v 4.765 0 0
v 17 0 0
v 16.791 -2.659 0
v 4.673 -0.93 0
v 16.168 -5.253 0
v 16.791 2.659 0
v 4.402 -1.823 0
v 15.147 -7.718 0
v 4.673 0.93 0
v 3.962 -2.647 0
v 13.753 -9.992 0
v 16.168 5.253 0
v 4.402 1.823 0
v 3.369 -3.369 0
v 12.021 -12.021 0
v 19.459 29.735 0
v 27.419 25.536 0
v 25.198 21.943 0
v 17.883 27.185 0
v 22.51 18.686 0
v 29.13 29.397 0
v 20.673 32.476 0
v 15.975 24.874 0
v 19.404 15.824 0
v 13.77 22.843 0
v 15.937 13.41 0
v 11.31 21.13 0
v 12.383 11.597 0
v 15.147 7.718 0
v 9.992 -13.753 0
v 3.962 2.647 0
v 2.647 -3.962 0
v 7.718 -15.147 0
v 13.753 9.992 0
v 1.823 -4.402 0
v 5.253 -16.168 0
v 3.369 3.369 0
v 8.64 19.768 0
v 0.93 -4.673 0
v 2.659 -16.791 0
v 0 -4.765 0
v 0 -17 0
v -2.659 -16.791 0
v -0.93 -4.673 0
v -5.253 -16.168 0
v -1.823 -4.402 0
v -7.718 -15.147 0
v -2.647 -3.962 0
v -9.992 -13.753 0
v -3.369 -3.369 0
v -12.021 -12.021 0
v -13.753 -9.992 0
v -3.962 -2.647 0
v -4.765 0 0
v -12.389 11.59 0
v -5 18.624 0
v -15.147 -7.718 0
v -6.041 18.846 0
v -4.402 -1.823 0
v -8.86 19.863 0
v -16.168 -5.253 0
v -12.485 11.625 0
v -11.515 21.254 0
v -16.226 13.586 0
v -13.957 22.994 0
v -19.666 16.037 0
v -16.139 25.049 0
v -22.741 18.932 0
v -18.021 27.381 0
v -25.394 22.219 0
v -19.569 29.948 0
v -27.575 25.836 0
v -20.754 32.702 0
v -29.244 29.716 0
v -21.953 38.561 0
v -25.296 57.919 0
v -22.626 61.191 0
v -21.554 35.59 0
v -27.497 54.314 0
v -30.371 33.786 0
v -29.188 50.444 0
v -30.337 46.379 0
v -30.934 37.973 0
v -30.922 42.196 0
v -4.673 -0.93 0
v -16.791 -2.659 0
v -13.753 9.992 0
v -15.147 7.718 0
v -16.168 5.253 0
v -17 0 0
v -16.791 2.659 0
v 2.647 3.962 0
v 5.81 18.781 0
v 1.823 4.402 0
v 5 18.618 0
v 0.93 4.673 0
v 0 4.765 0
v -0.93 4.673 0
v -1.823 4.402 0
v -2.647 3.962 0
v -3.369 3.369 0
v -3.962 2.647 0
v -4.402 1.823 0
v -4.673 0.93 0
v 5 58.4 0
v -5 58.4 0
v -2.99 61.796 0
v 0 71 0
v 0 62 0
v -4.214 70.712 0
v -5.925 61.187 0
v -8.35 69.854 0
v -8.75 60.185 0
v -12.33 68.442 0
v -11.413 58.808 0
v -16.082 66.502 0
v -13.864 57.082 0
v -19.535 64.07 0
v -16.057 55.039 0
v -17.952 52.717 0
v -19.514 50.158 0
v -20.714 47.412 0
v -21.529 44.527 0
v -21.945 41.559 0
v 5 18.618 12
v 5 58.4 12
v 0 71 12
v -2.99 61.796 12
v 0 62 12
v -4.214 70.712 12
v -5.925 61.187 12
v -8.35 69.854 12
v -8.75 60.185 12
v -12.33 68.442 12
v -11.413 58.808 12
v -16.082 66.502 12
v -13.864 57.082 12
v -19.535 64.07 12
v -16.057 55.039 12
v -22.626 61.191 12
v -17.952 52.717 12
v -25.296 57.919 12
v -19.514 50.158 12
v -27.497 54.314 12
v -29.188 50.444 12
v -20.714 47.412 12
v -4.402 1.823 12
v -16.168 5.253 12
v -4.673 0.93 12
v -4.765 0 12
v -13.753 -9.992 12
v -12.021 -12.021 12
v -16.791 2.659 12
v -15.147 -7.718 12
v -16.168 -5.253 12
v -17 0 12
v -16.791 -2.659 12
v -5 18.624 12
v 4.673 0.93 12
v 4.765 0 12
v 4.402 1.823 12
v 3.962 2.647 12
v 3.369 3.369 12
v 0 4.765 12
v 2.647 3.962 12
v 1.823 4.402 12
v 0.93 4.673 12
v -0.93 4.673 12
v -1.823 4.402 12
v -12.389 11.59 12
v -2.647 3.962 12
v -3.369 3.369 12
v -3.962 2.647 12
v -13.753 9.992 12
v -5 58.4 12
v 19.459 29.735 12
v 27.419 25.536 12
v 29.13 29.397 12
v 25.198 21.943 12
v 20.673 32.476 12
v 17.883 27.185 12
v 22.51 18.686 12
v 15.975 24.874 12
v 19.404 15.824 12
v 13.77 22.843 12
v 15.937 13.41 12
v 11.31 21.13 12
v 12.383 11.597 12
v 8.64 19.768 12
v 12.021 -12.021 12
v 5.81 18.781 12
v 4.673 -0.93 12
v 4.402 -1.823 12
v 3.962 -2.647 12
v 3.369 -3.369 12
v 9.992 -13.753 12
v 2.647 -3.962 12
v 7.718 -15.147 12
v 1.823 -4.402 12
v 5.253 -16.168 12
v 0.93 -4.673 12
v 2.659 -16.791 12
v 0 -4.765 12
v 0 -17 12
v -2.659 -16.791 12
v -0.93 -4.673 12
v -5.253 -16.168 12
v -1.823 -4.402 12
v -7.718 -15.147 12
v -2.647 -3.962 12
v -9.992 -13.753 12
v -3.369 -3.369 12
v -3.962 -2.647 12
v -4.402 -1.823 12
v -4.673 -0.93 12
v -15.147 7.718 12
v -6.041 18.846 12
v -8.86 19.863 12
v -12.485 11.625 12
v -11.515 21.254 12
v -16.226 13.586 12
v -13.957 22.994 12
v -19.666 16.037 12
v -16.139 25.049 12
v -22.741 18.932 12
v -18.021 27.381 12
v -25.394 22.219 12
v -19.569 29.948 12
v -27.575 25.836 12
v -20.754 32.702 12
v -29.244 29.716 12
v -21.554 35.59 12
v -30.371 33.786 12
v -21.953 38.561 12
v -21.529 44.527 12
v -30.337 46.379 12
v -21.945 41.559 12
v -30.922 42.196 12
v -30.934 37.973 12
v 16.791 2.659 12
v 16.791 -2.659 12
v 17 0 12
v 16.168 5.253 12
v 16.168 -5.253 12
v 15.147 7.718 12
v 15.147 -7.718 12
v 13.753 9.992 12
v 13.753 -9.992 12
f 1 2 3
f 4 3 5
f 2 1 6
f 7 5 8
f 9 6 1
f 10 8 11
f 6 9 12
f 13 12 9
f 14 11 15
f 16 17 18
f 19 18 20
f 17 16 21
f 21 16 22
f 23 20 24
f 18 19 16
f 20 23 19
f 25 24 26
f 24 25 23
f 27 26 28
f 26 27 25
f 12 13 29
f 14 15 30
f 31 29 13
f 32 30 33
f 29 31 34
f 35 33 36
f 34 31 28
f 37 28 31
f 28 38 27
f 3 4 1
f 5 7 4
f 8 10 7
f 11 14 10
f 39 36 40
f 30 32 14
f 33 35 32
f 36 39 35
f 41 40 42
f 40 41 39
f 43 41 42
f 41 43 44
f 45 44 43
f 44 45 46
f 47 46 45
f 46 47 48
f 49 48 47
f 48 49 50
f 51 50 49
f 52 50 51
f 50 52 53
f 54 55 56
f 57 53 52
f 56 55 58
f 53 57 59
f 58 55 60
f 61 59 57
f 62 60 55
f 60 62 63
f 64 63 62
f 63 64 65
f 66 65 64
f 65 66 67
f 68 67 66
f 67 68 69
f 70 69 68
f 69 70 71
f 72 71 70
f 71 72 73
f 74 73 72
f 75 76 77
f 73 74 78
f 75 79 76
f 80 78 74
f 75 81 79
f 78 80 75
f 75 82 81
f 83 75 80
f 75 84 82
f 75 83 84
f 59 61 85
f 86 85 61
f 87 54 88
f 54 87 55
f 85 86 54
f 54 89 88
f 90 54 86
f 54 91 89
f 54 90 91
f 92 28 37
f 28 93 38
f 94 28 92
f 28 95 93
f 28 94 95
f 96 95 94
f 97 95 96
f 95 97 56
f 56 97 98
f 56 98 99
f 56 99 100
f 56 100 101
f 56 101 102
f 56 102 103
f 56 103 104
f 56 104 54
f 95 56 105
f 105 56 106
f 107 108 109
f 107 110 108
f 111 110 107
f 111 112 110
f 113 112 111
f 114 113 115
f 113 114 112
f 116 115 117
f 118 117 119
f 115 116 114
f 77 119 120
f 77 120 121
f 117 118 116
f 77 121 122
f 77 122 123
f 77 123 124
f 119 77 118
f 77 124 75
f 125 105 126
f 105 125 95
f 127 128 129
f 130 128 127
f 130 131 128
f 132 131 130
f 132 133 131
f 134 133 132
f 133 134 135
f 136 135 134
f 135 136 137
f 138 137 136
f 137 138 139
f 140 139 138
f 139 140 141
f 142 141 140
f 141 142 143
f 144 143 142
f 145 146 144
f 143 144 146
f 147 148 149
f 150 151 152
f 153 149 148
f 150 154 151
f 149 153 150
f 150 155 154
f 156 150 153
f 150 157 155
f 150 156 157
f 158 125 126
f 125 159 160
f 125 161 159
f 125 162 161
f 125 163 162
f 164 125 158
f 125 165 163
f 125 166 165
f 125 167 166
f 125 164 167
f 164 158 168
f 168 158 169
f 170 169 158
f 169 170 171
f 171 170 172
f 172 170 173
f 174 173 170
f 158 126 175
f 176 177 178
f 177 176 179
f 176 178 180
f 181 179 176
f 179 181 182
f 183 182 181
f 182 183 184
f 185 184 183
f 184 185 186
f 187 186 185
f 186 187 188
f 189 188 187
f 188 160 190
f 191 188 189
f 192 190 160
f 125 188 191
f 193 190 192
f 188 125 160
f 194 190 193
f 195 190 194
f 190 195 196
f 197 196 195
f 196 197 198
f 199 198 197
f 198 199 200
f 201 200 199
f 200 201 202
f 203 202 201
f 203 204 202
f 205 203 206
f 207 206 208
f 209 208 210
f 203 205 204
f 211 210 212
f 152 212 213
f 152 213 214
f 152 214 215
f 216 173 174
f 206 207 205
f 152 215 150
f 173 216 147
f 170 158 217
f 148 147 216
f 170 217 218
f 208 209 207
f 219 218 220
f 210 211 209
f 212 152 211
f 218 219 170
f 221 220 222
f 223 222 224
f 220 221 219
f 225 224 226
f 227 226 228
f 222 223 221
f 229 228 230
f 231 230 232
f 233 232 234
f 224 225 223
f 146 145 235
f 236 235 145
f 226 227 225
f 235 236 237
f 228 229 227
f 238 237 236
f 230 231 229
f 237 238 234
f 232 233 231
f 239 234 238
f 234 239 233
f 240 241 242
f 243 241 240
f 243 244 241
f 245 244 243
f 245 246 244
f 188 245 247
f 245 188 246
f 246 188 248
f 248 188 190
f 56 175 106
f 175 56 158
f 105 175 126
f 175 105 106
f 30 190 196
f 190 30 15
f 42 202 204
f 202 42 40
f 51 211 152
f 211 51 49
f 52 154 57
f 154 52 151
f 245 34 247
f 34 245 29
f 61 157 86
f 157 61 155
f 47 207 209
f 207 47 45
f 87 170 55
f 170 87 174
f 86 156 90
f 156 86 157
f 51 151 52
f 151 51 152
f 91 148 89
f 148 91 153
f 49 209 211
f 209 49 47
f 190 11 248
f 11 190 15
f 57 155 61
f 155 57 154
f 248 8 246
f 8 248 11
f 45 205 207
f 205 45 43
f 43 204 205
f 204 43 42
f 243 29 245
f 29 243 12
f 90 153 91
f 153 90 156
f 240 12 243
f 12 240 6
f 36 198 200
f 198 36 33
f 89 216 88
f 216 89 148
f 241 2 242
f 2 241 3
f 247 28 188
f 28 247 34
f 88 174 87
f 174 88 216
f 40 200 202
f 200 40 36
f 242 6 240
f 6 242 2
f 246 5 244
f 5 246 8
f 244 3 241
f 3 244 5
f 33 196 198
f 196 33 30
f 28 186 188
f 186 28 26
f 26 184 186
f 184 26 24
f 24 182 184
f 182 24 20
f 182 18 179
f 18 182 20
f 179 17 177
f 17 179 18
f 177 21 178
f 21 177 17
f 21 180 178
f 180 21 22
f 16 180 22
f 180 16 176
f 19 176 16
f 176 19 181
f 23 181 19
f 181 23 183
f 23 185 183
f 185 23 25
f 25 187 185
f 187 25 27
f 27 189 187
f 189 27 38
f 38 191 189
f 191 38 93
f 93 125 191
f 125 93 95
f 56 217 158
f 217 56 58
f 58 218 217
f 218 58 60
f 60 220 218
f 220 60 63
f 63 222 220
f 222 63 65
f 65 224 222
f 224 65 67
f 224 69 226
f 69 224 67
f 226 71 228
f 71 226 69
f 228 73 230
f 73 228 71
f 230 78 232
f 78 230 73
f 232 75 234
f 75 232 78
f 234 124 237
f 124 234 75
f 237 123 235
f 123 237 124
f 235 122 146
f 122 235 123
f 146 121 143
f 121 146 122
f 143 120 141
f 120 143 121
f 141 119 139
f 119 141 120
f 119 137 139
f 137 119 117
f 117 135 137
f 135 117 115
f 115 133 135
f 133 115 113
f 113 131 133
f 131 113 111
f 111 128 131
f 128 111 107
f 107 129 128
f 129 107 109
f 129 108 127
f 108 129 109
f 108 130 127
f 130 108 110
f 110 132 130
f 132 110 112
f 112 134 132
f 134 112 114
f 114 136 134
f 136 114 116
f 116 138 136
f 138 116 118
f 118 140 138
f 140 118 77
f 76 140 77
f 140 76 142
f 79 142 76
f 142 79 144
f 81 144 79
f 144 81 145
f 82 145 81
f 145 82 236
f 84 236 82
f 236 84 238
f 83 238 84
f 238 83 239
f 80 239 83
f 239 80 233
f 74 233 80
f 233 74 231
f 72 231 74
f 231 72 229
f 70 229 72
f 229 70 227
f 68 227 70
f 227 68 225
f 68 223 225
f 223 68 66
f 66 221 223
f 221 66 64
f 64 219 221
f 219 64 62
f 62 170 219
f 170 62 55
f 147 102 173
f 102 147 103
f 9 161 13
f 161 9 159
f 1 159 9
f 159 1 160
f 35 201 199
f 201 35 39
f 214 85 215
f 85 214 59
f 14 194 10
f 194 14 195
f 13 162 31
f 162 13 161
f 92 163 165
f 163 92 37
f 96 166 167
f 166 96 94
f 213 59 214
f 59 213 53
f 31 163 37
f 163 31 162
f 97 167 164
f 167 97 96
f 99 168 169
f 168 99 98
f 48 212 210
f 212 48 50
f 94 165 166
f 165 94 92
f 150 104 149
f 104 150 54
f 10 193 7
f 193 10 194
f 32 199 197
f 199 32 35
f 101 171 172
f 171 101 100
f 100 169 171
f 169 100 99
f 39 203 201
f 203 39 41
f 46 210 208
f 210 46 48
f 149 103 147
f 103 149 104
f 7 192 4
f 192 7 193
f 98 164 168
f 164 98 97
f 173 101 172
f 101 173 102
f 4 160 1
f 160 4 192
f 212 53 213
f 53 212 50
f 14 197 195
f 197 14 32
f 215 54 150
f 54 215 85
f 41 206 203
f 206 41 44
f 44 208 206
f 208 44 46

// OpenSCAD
$fn = 32;

// ----------------------------------------------------------------------
// Hook: 80 mm shank into a 22 mm curl, 12 mm thick
// ----------------------------------------------------------------------

// --- parameters (mm) ---
shank_len = 80;           // shank length from the boss centre
shank_w = 10;             // shank width
boss_d = 34;              // boss diameter
bore_d = 9.53;            // boss bore
curl_in = 22;             // curl inner radius
curl_out = 31;            // curl outer radius
curl_sweep = 250;         // curl sweep angle
hook_t = 12;              // hook thickness

shank_profile = [[-5, 58.4], [5, 58.4], [5, 15], [-5, 15]];
boss_profile = [[17, 0], [16.791, 2.659], [16.168, 5.253], [15.147, 7.718], [13.753, 9.992], [12.021, 12.021], [9.992, 13.753], [7.718, 15.147], [5.253, 16.168], [2.659, 16.791], [0, 17], [-2.659, 16.791], [-5.253, 16.168], [-7.718, 15.147], [-9.992, 13.753], [-12.021, 12.021], [-13.753, 9.992], [-15.147, 7.718], [-16.168, 5.253], [-16.791, 2.659], [-17, 0], [-16.791, -2.659], [-16.168, -5.253], [-15.147, -7.718], [-13.753, -9.992], [-12.021, -12.021], [-9.992, -13.753], [-7.718, -15.147], [-5.253, -16.168], [-2.659, -16.791], [0, -17], [2.659, -16.791], [5.253, -16.168], [7.718, -15.147], [9.992, -13.753], [12.021, -12.021], [13.753, -9.992], [15.147, -7.718], [16.168, -5.253], [16.791, -2.659]];
curl_profile = [[0, 71], [-4.214, 70.712], [-8.35, 69.854], [-12.33, 68.442], [-16.082, 66.502], [-19.535, 64.07], [-22.626, 61.191], [-25.296, 57.919], [-27.497, 54.314], [-29.188, 50.444], [-30.337, 46.379], [-30.922, 42.196], [-30.934, 37.973], [-30.371, 33.786], [-29.244, 29.716], [-27.575, 25.836], [-25.394, 22.219], [-22.741, 18.932], [-19.666, 16.037], [-16.226, 13.586], [-12.485, 11.625], [-8.512, 10.192], [-4.381, 9.311], [-0.169, 9], [4.046, 9.265], [8.187, 10.101], [12.175, 11.491], [15.937, 13.41], [19.404, 15.824], [22.51, 18.686], [25.198, 21.943], [27.419, 25.536], [29.13, 29.397], [20.673, 32.476], [19.459, 29.735], [17.883, 27.185], [15.975, 24.874], [13.77, 22.843], [11.31, 21.13], [8.64, 19.768], [5.81, 18.781], [2.872, 18.188], [-0.12, 18], [-3.109, 18.221], [-6.041, 18.846], [-8.86, 19.863], [-11.515, 21.254], [-13.957, 22.994], [-16.139, 25.049], [-18.021, 27.381], [-19.569, 29.948], [-20.754, 32.702], [-21.554, 35.59], [-21.953, 38.561], [-21.945, 41.559], [-21.529, 44.527], [-20.714, 47.412], [-19.514, 50.158], [-17.952, 52.717], [-16.057, 55.039], [-13.864, 57.082], [-11.413, 58.808], [-8.75, 60.185], [-5.925, 61.187], [-2.99, 61.796], [0, 62]];

difference() {
  union() {
    /* three overlapping outlines: shank, boss and the smooth curl */
    linear_extrude(height = hook_t) polygon(shank_profile);
    linear_extrude(height = hook_t) polygon(boss_profile);
    linear_extrude(height = hook_t) polygon(curl_profile);
  }
  translate([0, 0, -2.5]) cylinder(h = hook_t + 5, d = bore_d);
}
